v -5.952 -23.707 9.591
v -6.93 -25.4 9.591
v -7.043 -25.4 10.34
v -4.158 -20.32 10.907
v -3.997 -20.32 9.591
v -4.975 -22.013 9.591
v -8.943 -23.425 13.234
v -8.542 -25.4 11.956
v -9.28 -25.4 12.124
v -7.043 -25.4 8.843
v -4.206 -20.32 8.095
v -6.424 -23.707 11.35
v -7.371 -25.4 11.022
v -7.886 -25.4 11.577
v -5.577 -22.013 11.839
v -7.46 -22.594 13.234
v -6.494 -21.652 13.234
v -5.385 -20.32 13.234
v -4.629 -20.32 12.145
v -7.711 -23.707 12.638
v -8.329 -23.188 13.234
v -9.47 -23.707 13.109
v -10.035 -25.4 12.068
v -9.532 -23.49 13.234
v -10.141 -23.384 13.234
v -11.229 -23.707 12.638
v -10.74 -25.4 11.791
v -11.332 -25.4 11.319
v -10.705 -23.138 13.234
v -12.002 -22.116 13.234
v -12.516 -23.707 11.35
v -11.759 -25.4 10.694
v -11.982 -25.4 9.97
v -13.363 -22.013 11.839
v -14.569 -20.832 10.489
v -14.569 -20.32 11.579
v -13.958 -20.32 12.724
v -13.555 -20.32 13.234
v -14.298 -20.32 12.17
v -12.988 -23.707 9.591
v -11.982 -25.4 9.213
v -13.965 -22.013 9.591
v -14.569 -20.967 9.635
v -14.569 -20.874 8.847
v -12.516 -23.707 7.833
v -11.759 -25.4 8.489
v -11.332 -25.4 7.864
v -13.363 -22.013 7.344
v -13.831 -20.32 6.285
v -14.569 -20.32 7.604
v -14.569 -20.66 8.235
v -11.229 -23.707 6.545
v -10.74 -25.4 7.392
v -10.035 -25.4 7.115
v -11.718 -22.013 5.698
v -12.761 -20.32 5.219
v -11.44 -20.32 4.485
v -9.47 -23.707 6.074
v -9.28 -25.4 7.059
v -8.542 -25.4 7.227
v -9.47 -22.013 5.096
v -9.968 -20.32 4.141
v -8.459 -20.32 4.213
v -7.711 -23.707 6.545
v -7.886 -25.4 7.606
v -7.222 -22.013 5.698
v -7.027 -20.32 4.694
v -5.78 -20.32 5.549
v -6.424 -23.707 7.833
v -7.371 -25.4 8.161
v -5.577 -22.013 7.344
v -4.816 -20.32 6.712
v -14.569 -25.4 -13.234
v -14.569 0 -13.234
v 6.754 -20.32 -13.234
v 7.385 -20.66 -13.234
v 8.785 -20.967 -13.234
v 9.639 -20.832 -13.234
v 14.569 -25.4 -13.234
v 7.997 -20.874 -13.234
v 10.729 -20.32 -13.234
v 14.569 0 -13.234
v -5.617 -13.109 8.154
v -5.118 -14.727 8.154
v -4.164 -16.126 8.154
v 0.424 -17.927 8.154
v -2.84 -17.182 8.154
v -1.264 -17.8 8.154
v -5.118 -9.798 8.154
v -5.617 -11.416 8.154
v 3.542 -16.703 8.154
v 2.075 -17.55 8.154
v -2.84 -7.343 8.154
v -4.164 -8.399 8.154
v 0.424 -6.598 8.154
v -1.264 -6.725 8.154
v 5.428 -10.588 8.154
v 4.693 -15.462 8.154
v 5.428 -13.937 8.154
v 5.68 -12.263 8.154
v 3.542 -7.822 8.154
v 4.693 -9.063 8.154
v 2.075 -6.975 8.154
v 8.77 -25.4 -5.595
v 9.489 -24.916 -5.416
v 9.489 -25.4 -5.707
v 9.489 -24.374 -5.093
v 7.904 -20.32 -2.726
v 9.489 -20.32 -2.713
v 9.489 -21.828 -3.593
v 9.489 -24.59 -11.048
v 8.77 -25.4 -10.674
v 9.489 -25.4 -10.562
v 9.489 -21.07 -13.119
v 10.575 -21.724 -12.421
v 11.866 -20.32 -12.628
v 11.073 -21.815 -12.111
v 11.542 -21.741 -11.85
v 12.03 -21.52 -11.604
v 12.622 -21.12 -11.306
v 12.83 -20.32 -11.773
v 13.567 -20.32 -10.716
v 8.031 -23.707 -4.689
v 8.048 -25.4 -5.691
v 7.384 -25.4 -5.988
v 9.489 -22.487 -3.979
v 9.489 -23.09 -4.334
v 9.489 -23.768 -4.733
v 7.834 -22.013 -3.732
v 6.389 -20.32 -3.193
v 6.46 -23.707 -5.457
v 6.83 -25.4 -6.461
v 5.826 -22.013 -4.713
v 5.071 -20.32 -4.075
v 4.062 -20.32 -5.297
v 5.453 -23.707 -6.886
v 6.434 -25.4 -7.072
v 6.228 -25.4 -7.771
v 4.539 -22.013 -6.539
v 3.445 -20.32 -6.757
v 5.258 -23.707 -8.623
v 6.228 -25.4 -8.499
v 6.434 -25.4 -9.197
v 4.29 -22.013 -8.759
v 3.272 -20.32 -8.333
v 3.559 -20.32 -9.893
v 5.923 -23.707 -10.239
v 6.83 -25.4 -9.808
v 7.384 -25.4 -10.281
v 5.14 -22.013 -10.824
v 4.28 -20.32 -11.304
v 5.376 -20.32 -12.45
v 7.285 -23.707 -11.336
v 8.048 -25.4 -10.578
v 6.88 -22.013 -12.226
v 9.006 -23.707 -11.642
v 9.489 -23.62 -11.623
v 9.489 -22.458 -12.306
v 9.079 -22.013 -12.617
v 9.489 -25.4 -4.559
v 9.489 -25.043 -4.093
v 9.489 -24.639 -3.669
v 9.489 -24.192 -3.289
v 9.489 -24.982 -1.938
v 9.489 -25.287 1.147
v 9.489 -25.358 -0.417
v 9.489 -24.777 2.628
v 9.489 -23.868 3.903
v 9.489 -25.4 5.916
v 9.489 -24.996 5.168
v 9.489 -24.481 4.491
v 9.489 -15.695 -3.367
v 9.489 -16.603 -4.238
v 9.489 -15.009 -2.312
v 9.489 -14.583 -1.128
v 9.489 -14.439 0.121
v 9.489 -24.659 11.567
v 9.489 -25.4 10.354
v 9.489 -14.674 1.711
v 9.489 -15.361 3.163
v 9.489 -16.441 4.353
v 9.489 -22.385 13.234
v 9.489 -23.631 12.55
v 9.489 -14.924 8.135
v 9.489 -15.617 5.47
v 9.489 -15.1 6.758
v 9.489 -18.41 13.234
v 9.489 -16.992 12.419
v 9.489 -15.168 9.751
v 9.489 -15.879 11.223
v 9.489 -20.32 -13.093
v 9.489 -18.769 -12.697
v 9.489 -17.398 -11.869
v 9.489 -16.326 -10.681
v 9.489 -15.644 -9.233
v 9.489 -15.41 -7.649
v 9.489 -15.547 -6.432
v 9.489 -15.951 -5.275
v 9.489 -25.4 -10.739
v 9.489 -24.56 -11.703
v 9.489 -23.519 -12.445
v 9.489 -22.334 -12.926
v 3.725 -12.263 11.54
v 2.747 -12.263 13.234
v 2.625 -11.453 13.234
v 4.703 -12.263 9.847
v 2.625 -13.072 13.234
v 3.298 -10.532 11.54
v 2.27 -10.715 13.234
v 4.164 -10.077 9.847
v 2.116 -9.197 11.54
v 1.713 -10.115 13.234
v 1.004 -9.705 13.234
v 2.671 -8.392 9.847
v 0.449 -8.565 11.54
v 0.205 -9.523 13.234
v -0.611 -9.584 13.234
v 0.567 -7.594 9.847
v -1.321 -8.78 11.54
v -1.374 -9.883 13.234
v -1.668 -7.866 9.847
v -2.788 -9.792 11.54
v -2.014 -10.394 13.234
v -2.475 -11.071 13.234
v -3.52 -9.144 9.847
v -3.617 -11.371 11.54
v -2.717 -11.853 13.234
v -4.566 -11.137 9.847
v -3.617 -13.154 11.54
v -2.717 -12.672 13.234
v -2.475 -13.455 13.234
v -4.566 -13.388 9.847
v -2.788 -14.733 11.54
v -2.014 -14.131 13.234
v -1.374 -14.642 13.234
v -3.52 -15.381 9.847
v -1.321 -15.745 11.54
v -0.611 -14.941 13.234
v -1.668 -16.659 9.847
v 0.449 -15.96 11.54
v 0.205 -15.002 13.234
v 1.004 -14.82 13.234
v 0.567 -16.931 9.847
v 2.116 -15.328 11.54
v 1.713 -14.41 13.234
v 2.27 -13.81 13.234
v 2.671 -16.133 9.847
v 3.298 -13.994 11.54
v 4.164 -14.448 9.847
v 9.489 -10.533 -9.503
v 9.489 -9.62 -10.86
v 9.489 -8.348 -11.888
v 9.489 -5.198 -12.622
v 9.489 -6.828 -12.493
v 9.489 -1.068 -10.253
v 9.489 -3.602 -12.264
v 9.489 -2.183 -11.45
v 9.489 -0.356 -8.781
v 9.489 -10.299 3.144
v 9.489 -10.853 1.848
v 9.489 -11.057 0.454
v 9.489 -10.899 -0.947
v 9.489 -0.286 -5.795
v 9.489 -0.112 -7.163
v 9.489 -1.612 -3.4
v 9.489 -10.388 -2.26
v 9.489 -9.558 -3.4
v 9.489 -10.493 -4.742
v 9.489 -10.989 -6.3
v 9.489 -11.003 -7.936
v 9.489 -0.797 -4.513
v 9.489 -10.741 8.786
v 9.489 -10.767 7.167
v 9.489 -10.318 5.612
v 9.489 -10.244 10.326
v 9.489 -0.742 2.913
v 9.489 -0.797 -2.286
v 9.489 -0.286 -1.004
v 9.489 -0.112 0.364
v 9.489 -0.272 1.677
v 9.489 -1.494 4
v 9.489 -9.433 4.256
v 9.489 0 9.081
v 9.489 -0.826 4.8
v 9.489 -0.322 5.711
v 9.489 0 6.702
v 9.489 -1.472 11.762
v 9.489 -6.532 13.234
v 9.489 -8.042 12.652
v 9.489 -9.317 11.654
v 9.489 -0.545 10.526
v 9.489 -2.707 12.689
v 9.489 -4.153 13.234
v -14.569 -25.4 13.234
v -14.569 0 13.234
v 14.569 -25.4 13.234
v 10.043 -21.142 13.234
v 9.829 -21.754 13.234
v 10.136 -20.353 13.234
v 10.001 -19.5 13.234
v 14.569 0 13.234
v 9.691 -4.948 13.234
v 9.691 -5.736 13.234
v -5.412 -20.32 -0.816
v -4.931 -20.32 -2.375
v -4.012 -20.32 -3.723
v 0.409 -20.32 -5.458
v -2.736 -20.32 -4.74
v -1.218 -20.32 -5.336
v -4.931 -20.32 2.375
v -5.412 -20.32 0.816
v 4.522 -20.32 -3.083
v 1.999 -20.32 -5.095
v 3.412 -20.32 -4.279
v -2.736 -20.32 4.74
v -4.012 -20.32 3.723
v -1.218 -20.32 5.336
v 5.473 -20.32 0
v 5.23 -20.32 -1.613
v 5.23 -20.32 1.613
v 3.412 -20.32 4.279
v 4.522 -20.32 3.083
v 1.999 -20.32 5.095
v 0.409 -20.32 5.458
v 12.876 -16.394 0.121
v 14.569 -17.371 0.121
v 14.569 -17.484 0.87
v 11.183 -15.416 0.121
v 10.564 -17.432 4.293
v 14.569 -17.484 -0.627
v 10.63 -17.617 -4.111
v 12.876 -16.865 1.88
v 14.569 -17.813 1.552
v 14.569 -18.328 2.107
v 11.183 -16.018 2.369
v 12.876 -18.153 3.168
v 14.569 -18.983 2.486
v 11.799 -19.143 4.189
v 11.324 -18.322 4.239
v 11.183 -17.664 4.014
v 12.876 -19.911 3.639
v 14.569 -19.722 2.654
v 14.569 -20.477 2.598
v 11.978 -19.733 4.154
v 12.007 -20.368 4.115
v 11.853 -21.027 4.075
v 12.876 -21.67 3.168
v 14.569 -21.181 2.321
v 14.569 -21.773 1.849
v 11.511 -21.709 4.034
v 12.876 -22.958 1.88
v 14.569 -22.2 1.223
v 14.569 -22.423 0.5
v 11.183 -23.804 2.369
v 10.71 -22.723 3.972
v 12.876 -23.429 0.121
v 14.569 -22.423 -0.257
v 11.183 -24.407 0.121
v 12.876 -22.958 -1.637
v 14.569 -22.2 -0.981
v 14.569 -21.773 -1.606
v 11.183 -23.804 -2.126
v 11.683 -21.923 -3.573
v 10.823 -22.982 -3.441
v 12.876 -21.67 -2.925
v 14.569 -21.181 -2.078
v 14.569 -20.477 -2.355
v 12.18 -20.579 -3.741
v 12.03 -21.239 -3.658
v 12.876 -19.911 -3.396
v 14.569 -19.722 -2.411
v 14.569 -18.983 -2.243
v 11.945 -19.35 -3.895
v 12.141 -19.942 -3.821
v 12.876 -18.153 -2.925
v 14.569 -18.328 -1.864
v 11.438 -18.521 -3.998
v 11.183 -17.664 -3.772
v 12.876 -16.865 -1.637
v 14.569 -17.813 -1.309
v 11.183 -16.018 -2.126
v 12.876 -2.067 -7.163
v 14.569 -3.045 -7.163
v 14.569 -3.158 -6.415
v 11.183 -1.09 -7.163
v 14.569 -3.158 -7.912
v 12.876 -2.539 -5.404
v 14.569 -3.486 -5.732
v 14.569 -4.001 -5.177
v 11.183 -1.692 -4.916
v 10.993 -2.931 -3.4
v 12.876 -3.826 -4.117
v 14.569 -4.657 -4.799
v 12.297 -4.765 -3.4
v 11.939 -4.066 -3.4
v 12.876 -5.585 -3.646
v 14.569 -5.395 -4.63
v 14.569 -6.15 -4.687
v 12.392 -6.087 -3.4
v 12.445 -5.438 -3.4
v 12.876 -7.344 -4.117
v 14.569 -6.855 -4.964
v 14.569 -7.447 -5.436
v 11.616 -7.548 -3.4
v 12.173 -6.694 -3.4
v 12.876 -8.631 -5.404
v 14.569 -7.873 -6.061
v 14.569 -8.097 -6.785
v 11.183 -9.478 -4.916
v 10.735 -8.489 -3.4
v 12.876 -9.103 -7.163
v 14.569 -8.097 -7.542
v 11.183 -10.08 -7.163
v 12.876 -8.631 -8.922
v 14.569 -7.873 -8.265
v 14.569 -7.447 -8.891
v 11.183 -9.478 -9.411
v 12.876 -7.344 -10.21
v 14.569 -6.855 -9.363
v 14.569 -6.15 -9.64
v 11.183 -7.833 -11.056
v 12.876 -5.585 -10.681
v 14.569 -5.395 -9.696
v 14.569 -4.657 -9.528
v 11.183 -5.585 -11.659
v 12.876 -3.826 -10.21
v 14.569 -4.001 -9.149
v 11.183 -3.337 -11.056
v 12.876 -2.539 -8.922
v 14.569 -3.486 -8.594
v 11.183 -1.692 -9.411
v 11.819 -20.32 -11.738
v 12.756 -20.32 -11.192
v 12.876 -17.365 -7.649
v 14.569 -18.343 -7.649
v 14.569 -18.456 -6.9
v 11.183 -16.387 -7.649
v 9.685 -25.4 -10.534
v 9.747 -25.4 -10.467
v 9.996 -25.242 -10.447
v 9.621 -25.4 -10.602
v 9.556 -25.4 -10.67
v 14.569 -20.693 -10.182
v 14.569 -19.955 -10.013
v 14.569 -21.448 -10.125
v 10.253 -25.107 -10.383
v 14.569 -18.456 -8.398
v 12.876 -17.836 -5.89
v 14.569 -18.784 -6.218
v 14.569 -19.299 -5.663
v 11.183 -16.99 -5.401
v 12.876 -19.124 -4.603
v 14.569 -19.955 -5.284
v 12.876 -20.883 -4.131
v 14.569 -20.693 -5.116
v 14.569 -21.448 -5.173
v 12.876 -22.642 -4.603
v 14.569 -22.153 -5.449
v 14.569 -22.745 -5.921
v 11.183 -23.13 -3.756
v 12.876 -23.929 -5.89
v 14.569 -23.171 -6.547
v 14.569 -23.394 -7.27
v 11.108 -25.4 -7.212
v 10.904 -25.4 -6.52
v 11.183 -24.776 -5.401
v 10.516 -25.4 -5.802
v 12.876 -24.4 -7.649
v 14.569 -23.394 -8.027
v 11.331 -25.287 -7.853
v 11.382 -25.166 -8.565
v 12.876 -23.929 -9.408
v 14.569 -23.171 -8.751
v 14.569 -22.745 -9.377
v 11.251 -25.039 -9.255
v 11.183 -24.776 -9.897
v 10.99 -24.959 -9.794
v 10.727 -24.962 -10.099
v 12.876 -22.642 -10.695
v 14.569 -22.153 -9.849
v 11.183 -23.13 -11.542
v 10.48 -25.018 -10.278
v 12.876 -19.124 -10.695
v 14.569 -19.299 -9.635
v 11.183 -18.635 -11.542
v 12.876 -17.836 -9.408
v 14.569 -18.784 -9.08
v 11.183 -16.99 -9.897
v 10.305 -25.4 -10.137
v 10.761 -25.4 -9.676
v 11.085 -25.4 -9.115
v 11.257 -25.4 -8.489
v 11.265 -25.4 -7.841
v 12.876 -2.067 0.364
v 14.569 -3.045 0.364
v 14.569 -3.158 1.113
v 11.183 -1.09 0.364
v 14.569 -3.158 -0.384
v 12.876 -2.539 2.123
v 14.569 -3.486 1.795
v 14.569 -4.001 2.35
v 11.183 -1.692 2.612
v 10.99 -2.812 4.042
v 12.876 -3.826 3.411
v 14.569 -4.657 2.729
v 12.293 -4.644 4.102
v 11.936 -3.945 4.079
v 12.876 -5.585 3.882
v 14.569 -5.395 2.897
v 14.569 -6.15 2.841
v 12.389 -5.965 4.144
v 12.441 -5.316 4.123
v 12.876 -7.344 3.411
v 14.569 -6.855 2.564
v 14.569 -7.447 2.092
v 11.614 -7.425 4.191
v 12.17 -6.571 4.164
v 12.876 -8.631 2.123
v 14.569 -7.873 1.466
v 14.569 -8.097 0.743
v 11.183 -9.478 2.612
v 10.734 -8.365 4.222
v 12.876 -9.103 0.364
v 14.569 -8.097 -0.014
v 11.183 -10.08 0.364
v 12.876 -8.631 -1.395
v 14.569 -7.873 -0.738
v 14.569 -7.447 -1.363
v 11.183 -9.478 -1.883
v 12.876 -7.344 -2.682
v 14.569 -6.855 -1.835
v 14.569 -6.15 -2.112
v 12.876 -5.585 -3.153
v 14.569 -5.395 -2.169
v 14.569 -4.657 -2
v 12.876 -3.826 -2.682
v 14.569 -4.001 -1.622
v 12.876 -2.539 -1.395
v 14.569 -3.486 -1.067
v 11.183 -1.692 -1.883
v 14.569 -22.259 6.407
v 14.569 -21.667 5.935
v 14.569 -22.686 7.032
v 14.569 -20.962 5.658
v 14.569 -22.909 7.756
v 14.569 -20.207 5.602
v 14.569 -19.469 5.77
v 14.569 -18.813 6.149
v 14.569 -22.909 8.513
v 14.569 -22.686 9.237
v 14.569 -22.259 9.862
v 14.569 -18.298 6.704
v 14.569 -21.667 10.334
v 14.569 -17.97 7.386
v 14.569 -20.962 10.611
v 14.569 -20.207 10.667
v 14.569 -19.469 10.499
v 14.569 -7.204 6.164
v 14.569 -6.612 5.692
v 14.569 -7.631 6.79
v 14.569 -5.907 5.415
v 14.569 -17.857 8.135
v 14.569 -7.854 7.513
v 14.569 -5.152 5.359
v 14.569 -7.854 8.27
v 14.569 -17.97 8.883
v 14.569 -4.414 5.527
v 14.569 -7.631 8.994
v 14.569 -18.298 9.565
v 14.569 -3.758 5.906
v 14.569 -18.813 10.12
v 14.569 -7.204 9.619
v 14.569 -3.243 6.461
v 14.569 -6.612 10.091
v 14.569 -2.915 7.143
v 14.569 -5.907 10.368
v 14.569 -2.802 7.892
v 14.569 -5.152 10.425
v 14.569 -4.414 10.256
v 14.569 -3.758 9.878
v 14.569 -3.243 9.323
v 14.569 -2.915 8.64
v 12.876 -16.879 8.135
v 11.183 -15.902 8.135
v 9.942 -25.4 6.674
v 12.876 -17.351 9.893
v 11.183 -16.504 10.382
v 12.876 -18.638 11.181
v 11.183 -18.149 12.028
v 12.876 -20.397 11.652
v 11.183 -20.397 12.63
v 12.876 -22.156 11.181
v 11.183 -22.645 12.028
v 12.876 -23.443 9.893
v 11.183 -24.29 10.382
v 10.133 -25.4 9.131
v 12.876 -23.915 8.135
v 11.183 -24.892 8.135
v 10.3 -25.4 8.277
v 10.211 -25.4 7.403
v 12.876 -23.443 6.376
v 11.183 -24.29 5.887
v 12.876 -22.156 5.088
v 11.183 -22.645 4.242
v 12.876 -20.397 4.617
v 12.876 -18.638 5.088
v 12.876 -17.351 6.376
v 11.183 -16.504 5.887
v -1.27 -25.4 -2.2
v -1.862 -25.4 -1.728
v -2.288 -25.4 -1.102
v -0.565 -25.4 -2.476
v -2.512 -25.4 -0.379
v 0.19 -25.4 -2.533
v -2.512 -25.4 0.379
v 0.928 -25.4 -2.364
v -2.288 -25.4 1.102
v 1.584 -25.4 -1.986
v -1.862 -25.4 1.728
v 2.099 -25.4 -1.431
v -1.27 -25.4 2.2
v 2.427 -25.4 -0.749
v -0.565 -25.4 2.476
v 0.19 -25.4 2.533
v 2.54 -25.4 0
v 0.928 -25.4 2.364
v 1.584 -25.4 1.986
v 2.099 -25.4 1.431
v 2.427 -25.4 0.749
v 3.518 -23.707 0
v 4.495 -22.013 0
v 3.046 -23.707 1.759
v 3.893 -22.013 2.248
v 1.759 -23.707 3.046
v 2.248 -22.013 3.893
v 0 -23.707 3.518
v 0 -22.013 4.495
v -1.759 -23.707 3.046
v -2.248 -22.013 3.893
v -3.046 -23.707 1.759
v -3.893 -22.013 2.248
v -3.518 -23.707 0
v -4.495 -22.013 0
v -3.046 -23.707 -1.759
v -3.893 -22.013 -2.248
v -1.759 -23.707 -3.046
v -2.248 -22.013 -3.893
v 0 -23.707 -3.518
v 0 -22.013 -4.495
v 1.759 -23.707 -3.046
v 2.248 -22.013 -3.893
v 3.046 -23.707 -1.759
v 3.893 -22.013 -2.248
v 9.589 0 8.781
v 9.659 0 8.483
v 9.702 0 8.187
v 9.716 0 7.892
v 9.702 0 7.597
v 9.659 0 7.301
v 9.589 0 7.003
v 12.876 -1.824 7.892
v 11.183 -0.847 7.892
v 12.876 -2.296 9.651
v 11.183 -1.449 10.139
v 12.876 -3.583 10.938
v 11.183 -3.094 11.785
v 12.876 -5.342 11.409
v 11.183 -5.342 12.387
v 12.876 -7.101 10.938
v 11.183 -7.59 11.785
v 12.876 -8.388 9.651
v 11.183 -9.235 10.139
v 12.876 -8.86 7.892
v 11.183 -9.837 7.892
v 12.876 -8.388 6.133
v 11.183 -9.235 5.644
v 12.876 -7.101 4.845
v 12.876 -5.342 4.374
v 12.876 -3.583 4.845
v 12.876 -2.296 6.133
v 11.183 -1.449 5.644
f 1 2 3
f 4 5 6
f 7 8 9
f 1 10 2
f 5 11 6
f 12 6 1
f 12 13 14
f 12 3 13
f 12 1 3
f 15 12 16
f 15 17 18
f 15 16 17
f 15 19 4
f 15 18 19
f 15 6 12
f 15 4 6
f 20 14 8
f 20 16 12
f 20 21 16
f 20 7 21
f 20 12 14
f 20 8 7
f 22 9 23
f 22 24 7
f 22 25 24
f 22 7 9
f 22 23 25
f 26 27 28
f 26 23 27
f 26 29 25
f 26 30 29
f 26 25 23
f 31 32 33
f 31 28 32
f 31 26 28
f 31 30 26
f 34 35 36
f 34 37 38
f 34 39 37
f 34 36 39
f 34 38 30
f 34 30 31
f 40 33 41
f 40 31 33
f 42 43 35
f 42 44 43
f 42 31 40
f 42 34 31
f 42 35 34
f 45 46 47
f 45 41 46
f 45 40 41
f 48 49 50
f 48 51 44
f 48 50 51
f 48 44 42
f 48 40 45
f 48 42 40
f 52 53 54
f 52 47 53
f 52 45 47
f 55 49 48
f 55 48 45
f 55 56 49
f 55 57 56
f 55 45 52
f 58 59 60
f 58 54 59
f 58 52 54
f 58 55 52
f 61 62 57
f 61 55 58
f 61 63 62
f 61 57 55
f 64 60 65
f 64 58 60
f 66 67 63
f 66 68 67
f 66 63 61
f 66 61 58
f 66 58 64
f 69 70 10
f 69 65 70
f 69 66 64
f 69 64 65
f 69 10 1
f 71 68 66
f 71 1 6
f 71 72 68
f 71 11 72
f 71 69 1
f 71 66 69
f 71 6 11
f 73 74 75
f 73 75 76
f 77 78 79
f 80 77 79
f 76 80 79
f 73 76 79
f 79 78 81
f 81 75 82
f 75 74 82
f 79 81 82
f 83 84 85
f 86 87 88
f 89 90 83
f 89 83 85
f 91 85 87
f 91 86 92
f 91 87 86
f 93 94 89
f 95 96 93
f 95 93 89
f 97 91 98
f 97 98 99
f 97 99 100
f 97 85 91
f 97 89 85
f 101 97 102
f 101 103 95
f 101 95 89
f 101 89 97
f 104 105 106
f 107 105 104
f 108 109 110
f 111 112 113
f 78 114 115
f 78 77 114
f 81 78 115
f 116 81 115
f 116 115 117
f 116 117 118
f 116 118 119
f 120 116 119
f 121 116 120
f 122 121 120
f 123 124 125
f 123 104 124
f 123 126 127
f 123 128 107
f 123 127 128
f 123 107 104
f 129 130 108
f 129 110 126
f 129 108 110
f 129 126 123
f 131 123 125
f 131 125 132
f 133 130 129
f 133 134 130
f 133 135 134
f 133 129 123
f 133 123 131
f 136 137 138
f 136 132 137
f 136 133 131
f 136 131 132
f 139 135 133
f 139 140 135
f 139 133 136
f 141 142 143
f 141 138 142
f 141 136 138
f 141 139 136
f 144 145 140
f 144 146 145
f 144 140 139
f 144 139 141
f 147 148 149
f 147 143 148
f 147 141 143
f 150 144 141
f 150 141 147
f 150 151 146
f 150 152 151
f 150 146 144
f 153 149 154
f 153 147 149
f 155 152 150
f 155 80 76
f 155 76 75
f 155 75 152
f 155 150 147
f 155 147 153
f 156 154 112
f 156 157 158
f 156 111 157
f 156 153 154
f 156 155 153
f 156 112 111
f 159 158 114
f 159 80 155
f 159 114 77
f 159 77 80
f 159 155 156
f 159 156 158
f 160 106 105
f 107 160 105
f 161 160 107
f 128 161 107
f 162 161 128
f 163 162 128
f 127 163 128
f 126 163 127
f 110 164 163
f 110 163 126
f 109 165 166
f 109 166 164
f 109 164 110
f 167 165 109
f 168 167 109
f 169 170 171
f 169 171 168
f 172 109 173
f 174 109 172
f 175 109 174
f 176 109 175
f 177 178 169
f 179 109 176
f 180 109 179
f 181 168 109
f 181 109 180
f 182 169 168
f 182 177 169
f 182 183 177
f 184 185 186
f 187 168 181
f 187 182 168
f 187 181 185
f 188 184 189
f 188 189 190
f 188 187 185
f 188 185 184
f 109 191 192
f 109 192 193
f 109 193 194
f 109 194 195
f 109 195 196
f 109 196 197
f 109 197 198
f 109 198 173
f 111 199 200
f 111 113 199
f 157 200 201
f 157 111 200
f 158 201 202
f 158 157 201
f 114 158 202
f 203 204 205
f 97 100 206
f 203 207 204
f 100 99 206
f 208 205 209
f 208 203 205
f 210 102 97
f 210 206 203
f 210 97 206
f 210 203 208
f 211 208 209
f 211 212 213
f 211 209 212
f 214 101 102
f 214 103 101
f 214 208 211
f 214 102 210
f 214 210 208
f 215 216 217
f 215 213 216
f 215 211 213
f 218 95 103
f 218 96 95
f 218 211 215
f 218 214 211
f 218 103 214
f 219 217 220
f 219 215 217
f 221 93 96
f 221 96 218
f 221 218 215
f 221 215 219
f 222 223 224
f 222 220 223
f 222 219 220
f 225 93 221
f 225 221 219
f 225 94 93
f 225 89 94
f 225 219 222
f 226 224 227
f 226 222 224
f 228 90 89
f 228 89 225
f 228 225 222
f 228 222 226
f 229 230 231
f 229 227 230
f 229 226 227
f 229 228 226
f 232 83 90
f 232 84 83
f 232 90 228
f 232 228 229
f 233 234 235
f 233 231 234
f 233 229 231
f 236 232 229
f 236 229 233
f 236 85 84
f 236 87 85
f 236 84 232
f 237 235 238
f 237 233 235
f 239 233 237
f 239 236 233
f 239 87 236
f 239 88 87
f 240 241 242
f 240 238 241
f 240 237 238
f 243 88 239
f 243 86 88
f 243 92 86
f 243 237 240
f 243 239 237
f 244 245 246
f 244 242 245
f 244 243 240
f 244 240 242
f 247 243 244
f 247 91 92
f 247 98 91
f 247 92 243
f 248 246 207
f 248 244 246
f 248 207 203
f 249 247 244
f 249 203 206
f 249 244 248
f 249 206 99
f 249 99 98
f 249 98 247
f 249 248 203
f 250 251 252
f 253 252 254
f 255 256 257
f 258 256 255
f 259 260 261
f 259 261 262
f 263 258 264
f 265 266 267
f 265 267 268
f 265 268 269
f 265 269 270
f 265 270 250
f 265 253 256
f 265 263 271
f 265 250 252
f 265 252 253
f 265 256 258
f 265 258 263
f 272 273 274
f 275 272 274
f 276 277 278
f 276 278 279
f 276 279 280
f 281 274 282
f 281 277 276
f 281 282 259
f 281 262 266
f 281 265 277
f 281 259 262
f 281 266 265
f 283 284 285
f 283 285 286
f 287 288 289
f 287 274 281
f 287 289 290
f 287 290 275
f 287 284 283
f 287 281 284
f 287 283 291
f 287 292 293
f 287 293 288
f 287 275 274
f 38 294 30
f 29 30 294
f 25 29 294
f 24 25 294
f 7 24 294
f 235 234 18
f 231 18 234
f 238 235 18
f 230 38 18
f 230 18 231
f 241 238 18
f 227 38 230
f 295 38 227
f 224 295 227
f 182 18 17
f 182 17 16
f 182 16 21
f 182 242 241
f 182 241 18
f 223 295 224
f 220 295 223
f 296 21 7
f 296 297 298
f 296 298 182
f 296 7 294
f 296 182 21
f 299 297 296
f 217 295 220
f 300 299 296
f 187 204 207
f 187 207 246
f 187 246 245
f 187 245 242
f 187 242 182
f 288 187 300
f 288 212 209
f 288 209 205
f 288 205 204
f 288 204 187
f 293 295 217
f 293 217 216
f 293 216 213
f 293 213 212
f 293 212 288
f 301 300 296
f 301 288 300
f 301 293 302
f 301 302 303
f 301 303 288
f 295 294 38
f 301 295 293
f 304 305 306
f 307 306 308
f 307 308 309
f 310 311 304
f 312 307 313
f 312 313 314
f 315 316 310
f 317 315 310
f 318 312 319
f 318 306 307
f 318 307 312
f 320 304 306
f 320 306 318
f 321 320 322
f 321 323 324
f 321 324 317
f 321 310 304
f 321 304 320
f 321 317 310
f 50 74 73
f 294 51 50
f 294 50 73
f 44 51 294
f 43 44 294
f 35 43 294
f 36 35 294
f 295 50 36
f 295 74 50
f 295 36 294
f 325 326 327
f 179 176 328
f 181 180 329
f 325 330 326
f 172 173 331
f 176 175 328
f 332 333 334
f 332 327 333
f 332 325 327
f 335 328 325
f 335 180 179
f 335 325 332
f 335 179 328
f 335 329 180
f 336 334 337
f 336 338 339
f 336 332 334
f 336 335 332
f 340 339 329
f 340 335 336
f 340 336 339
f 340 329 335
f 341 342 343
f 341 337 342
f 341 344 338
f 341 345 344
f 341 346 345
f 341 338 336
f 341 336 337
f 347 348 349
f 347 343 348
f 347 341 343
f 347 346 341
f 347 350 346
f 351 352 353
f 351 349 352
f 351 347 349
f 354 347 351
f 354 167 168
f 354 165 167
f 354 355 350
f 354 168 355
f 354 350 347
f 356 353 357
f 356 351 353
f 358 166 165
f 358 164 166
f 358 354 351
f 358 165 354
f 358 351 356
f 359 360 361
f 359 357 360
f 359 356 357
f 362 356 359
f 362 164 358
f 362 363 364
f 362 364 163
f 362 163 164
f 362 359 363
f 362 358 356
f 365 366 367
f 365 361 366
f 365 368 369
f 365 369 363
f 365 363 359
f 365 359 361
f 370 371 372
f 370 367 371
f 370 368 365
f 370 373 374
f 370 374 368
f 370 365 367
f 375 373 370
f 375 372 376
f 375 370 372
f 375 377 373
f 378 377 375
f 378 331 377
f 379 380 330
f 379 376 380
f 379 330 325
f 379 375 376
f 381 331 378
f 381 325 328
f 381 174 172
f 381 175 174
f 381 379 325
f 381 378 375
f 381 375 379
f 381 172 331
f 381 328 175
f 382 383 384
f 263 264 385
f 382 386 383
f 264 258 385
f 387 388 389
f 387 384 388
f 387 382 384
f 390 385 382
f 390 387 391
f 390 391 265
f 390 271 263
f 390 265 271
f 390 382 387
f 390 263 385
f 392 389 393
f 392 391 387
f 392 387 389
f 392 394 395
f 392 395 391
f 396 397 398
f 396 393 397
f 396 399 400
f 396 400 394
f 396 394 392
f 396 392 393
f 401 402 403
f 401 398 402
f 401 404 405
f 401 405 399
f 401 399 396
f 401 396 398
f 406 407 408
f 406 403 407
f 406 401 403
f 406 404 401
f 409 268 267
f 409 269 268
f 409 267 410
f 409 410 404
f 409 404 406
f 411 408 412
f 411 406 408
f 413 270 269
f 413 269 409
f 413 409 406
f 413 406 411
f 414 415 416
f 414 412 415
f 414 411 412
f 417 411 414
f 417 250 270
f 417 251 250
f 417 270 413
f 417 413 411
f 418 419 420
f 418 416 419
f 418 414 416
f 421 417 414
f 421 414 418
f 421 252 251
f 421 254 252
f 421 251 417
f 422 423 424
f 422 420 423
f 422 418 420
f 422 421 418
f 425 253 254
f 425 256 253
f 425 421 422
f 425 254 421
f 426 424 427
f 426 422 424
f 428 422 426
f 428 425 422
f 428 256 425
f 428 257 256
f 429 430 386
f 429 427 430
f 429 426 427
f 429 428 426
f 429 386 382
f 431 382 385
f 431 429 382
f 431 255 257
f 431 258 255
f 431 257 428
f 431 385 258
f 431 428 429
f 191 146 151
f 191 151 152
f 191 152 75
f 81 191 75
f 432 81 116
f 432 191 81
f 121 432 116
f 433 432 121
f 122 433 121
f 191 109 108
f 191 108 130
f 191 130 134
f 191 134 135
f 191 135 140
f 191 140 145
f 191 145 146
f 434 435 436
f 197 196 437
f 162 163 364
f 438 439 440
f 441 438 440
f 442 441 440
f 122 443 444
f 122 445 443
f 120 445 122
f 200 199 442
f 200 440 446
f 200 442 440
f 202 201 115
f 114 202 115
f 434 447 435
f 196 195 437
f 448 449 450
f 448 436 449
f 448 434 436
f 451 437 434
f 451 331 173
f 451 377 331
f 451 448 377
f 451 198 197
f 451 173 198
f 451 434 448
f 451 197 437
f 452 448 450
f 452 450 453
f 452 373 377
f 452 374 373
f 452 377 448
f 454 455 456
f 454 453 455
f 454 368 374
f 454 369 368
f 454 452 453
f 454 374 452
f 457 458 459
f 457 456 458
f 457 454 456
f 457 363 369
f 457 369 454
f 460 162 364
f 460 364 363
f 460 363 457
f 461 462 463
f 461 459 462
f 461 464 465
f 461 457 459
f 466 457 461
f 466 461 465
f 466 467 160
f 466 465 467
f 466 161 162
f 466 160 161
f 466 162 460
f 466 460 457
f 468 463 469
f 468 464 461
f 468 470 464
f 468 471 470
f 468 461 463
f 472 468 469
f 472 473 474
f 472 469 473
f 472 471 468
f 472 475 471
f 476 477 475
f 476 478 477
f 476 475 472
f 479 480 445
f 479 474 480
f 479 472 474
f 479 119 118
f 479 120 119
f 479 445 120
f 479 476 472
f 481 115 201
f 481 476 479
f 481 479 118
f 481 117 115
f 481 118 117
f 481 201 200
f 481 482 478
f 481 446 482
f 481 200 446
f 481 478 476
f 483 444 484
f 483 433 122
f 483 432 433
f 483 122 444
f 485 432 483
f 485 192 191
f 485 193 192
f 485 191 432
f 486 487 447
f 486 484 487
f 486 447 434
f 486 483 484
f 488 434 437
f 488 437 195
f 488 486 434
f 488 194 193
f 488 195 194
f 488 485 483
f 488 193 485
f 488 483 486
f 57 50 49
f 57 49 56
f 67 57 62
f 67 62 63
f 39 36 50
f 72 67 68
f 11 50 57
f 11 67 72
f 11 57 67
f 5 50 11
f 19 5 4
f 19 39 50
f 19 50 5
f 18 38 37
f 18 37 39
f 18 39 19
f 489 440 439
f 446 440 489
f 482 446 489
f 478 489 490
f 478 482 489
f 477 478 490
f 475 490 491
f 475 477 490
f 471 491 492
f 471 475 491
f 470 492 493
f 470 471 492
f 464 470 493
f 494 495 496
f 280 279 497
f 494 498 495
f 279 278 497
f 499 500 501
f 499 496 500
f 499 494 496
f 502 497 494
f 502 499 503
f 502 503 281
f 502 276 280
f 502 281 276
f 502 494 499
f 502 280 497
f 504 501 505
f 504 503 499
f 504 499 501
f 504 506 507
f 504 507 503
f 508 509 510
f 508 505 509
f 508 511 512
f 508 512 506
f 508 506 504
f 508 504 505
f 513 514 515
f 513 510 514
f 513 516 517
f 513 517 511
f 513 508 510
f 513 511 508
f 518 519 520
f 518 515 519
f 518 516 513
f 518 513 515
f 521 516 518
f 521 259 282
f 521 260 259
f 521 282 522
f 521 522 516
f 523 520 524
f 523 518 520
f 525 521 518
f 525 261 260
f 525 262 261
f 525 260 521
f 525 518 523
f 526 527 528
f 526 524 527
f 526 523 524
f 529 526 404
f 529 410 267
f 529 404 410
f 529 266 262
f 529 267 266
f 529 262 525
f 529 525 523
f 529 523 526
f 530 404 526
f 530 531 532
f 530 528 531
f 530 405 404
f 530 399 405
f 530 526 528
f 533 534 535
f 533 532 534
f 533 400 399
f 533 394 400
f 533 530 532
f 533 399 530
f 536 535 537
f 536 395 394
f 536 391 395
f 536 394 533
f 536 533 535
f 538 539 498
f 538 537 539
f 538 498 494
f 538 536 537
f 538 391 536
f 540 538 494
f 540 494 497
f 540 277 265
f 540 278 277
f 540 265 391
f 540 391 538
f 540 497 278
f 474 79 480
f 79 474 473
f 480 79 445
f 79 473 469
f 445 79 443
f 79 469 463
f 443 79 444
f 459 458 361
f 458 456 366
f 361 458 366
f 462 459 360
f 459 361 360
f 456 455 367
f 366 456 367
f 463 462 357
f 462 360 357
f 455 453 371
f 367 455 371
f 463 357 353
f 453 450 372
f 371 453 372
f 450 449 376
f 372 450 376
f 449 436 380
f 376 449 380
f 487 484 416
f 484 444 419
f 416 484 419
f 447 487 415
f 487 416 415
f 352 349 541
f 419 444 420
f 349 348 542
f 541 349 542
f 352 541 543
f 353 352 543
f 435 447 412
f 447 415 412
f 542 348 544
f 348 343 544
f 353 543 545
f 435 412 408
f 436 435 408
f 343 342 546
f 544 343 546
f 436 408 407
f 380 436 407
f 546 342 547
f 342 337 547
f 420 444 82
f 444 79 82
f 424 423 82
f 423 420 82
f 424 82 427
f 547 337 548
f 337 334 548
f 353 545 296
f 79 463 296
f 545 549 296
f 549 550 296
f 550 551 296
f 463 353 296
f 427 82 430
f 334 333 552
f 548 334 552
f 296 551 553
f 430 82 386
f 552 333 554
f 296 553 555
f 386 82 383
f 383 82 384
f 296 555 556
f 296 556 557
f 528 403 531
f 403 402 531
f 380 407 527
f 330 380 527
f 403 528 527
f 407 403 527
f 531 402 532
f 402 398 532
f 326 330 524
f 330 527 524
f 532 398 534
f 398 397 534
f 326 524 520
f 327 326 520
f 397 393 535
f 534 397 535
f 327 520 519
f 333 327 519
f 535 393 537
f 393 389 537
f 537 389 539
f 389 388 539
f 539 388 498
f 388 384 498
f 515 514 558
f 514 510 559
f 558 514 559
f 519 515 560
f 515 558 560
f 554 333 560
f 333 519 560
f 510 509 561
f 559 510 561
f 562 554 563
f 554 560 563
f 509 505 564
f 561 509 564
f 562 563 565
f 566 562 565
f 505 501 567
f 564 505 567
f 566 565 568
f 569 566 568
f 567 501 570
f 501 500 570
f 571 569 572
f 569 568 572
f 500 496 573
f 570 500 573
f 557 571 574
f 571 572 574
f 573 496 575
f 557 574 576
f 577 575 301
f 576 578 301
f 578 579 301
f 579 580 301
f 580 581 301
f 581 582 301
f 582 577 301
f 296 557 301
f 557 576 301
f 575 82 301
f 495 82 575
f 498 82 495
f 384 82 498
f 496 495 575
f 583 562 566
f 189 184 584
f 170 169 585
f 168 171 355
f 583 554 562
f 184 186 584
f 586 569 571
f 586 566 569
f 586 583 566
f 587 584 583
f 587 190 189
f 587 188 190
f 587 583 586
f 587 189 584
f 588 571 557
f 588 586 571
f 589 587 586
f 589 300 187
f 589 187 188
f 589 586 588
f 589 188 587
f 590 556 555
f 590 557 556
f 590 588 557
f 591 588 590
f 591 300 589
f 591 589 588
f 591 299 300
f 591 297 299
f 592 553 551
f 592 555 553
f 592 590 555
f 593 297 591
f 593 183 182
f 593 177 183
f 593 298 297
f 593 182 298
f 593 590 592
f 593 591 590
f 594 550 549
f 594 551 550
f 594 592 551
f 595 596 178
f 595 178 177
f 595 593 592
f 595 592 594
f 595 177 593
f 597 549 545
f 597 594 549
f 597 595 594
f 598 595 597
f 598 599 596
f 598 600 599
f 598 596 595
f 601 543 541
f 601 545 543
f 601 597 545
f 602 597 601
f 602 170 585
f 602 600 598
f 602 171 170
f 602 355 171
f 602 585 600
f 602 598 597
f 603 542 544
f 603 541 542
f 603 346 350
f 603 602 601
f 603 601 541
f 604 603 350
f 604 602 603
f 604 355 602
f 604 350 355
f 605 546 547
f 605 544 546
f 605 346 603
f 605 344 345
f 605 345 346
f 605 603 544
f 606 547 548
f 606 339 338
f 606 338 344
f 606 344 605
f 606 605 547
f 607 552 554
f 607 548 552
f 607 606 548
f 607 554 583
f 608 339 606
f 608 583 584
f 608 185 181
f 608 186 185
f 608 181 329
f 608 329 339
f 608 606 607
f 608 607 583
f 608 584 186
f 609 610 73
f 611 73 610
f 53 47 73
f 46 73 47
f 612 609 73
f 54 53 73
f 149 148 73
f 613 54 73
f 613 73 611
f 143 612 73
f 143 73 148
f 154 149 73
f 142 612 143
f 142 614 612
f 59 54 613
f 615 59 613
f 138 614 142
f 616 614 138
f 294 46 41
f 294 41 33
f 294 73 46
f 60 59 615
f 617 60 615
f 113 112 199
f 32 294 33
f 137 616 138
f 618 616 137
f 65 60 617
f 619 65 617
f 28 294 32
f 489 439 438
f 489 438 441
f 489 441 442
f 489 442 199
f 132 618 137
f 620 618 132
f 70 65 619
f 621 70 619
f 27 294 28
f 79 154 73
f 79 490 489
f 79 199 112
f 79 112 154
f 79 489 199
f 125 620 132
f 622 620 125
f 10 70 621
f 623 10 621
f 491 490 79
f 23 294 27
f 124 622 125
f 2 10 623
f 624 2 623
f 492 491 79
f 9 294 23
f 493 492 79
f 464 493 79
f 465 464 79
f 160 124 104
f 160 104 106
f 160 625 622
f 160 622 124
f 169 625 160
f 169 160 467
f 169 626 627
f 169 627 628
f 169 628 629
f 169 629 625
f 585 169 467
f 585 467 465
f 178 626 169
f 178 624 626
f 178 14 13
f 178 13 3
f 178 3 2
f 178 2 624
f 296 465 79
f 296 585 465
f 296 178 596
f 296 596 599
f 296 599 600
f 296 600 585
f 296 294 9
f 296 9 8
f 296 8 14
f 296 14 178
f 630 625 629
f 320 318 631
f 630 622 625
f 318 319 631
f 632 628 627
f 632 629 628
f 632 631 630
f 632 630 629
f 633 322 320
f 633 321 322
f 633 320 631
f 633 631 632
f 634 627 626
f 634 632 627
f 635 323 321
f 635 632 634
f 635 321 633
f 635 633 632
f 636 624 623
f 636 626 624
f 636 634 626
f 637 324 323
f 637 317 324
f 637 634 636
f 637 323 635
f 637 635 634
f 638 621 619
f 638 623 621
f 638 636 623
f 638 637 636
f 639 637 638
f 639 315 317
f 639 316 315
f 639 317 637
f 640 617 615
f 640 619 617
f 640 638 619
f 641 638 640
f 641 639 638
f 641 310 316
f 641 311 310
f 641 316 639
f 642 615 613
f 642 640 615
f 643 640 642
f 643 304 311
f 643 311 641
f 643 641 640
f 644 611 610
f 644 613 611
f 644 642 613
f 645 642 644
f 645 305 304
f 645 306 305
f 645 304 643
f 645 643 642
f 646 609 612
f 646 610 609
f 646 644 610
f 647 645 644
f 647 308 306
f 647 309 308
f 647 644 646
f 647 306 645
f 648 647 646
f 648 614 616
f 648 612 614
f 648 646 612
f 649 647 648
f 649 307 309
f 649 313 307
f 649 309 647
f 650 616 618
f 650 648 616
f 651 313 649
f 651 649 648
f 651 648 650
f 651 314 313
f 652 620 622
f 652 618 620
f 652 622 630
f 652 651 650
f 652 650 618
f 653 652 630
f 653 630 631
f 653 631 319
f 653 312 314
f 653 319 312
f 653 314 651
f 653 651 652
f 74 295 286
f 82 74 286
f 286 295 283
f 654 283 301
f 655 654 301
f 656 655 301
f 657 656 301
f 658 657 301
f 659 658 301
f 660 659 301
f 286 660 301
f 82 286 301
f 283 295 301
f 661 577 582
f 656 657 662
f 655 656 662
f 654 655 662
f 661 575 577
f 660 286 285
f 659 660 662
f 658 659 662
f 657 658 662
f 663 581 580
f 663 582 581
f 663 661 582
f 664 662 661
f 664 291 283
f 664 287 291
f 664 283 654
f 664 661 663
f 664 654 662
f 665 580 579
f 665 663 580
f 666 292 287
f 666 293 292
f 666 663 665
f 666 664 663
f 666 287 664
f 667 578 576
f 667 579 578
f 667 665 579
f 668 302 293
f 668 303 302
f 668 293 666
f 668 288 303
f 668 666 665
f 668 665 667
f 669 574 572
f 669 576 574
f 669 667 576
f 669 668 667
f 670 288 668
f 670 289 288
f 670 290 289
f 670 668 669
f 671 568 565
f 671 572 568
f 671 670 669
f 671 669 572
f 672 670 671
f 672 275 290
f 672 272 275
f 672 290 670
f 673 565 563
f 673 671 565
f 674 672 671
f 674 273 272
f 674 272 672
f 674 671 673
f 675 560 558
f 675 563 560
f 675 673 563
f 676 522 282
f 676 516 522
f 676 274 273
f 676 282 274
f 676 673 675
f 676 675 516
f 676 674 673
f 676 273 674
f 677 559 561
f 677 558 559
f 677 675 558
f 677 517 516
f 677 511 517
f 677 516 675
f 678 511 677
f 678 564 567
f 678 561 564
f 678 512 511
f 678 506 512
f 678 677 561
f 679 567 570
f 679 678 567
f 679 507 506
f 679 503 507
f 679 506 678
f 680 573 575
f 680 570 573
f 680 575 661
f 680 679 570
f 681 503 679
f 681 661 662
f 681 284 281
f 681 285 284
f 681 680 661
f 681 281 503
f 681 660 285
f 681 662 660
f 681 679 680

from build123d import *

# Parameters (mm, degrees)
F0_W     = 29.1386954486
F0_H     = 26.4676492661
F1_DEPTH = 25.4
F2_R     = 2.7472233706
F3_DEPTH = 5.08
F3_TAPER = -30
F4_R     = 2.54
F5_DEPTH = 5.08
F5_TAPER = -30
F6_R     = 2.54
F7_DEPTH = 5.08
F7_TAPER = -30


with BuildPart() as f1:
    # F0 (on Front) → F1 (new body)
    with BuildSketch(Plane.XZ):
        Rectangle(F0_W, F0_H)
    extrude(amount=F1_DEPTH)

    # F2 (on face) → F3 (cut)
    with BuildSketch(Plane.XY.offset(13.2338246331)):
        with Locations((0, -12.2625352815)):
            Circle(F2_R)
    extrude(amount=-F3_DEPTH, taper=F3_TAPER, mode=Mode.SUBTRACT)

    # F4 (on face) → F5 (cut)
    with BuildSketch(Plane.XZ.offset(25.4)):
        with Locations((8.7416088209, -8.1345522776)):
            Circle(F4_R)
        Circle(F4_R)
        with Locations((-9.4700763002, 9.5914872363)):
            Circle(F4_R)
    extrude(amount=-F5_DEPTH, taper=F5_TAPER, mode=Mode.SUBTRACT)

    # F6 (on face) → F7 (cut)
    with BuildSketch(Plane.YZ.offset(14.5693477243)):
        with Locations((-20.3970875591, 8.1345522776)):
            Circle(F6_R)
        with Locations((-19.911441952, 0.1214112272)):
            Circle(F6_R)
        with Locations((-20.8827313036, -7.6489071362)):
            Circle(F6_R)
        with Locations((-5.5849160999, -7.1632624604)):
            Circle(F6_R)
        with Locations((-5.5849160999, 0.3642337106)):
            Circle(F6_R)
        with Locations((-5.342093762, 7.8917304054)):
            Circle(F6_R)
    extrude(amount=-F7_DEPTH, taper=F7_TAPER, mode=Mode.SUBTRACT)


solid = f1.part
